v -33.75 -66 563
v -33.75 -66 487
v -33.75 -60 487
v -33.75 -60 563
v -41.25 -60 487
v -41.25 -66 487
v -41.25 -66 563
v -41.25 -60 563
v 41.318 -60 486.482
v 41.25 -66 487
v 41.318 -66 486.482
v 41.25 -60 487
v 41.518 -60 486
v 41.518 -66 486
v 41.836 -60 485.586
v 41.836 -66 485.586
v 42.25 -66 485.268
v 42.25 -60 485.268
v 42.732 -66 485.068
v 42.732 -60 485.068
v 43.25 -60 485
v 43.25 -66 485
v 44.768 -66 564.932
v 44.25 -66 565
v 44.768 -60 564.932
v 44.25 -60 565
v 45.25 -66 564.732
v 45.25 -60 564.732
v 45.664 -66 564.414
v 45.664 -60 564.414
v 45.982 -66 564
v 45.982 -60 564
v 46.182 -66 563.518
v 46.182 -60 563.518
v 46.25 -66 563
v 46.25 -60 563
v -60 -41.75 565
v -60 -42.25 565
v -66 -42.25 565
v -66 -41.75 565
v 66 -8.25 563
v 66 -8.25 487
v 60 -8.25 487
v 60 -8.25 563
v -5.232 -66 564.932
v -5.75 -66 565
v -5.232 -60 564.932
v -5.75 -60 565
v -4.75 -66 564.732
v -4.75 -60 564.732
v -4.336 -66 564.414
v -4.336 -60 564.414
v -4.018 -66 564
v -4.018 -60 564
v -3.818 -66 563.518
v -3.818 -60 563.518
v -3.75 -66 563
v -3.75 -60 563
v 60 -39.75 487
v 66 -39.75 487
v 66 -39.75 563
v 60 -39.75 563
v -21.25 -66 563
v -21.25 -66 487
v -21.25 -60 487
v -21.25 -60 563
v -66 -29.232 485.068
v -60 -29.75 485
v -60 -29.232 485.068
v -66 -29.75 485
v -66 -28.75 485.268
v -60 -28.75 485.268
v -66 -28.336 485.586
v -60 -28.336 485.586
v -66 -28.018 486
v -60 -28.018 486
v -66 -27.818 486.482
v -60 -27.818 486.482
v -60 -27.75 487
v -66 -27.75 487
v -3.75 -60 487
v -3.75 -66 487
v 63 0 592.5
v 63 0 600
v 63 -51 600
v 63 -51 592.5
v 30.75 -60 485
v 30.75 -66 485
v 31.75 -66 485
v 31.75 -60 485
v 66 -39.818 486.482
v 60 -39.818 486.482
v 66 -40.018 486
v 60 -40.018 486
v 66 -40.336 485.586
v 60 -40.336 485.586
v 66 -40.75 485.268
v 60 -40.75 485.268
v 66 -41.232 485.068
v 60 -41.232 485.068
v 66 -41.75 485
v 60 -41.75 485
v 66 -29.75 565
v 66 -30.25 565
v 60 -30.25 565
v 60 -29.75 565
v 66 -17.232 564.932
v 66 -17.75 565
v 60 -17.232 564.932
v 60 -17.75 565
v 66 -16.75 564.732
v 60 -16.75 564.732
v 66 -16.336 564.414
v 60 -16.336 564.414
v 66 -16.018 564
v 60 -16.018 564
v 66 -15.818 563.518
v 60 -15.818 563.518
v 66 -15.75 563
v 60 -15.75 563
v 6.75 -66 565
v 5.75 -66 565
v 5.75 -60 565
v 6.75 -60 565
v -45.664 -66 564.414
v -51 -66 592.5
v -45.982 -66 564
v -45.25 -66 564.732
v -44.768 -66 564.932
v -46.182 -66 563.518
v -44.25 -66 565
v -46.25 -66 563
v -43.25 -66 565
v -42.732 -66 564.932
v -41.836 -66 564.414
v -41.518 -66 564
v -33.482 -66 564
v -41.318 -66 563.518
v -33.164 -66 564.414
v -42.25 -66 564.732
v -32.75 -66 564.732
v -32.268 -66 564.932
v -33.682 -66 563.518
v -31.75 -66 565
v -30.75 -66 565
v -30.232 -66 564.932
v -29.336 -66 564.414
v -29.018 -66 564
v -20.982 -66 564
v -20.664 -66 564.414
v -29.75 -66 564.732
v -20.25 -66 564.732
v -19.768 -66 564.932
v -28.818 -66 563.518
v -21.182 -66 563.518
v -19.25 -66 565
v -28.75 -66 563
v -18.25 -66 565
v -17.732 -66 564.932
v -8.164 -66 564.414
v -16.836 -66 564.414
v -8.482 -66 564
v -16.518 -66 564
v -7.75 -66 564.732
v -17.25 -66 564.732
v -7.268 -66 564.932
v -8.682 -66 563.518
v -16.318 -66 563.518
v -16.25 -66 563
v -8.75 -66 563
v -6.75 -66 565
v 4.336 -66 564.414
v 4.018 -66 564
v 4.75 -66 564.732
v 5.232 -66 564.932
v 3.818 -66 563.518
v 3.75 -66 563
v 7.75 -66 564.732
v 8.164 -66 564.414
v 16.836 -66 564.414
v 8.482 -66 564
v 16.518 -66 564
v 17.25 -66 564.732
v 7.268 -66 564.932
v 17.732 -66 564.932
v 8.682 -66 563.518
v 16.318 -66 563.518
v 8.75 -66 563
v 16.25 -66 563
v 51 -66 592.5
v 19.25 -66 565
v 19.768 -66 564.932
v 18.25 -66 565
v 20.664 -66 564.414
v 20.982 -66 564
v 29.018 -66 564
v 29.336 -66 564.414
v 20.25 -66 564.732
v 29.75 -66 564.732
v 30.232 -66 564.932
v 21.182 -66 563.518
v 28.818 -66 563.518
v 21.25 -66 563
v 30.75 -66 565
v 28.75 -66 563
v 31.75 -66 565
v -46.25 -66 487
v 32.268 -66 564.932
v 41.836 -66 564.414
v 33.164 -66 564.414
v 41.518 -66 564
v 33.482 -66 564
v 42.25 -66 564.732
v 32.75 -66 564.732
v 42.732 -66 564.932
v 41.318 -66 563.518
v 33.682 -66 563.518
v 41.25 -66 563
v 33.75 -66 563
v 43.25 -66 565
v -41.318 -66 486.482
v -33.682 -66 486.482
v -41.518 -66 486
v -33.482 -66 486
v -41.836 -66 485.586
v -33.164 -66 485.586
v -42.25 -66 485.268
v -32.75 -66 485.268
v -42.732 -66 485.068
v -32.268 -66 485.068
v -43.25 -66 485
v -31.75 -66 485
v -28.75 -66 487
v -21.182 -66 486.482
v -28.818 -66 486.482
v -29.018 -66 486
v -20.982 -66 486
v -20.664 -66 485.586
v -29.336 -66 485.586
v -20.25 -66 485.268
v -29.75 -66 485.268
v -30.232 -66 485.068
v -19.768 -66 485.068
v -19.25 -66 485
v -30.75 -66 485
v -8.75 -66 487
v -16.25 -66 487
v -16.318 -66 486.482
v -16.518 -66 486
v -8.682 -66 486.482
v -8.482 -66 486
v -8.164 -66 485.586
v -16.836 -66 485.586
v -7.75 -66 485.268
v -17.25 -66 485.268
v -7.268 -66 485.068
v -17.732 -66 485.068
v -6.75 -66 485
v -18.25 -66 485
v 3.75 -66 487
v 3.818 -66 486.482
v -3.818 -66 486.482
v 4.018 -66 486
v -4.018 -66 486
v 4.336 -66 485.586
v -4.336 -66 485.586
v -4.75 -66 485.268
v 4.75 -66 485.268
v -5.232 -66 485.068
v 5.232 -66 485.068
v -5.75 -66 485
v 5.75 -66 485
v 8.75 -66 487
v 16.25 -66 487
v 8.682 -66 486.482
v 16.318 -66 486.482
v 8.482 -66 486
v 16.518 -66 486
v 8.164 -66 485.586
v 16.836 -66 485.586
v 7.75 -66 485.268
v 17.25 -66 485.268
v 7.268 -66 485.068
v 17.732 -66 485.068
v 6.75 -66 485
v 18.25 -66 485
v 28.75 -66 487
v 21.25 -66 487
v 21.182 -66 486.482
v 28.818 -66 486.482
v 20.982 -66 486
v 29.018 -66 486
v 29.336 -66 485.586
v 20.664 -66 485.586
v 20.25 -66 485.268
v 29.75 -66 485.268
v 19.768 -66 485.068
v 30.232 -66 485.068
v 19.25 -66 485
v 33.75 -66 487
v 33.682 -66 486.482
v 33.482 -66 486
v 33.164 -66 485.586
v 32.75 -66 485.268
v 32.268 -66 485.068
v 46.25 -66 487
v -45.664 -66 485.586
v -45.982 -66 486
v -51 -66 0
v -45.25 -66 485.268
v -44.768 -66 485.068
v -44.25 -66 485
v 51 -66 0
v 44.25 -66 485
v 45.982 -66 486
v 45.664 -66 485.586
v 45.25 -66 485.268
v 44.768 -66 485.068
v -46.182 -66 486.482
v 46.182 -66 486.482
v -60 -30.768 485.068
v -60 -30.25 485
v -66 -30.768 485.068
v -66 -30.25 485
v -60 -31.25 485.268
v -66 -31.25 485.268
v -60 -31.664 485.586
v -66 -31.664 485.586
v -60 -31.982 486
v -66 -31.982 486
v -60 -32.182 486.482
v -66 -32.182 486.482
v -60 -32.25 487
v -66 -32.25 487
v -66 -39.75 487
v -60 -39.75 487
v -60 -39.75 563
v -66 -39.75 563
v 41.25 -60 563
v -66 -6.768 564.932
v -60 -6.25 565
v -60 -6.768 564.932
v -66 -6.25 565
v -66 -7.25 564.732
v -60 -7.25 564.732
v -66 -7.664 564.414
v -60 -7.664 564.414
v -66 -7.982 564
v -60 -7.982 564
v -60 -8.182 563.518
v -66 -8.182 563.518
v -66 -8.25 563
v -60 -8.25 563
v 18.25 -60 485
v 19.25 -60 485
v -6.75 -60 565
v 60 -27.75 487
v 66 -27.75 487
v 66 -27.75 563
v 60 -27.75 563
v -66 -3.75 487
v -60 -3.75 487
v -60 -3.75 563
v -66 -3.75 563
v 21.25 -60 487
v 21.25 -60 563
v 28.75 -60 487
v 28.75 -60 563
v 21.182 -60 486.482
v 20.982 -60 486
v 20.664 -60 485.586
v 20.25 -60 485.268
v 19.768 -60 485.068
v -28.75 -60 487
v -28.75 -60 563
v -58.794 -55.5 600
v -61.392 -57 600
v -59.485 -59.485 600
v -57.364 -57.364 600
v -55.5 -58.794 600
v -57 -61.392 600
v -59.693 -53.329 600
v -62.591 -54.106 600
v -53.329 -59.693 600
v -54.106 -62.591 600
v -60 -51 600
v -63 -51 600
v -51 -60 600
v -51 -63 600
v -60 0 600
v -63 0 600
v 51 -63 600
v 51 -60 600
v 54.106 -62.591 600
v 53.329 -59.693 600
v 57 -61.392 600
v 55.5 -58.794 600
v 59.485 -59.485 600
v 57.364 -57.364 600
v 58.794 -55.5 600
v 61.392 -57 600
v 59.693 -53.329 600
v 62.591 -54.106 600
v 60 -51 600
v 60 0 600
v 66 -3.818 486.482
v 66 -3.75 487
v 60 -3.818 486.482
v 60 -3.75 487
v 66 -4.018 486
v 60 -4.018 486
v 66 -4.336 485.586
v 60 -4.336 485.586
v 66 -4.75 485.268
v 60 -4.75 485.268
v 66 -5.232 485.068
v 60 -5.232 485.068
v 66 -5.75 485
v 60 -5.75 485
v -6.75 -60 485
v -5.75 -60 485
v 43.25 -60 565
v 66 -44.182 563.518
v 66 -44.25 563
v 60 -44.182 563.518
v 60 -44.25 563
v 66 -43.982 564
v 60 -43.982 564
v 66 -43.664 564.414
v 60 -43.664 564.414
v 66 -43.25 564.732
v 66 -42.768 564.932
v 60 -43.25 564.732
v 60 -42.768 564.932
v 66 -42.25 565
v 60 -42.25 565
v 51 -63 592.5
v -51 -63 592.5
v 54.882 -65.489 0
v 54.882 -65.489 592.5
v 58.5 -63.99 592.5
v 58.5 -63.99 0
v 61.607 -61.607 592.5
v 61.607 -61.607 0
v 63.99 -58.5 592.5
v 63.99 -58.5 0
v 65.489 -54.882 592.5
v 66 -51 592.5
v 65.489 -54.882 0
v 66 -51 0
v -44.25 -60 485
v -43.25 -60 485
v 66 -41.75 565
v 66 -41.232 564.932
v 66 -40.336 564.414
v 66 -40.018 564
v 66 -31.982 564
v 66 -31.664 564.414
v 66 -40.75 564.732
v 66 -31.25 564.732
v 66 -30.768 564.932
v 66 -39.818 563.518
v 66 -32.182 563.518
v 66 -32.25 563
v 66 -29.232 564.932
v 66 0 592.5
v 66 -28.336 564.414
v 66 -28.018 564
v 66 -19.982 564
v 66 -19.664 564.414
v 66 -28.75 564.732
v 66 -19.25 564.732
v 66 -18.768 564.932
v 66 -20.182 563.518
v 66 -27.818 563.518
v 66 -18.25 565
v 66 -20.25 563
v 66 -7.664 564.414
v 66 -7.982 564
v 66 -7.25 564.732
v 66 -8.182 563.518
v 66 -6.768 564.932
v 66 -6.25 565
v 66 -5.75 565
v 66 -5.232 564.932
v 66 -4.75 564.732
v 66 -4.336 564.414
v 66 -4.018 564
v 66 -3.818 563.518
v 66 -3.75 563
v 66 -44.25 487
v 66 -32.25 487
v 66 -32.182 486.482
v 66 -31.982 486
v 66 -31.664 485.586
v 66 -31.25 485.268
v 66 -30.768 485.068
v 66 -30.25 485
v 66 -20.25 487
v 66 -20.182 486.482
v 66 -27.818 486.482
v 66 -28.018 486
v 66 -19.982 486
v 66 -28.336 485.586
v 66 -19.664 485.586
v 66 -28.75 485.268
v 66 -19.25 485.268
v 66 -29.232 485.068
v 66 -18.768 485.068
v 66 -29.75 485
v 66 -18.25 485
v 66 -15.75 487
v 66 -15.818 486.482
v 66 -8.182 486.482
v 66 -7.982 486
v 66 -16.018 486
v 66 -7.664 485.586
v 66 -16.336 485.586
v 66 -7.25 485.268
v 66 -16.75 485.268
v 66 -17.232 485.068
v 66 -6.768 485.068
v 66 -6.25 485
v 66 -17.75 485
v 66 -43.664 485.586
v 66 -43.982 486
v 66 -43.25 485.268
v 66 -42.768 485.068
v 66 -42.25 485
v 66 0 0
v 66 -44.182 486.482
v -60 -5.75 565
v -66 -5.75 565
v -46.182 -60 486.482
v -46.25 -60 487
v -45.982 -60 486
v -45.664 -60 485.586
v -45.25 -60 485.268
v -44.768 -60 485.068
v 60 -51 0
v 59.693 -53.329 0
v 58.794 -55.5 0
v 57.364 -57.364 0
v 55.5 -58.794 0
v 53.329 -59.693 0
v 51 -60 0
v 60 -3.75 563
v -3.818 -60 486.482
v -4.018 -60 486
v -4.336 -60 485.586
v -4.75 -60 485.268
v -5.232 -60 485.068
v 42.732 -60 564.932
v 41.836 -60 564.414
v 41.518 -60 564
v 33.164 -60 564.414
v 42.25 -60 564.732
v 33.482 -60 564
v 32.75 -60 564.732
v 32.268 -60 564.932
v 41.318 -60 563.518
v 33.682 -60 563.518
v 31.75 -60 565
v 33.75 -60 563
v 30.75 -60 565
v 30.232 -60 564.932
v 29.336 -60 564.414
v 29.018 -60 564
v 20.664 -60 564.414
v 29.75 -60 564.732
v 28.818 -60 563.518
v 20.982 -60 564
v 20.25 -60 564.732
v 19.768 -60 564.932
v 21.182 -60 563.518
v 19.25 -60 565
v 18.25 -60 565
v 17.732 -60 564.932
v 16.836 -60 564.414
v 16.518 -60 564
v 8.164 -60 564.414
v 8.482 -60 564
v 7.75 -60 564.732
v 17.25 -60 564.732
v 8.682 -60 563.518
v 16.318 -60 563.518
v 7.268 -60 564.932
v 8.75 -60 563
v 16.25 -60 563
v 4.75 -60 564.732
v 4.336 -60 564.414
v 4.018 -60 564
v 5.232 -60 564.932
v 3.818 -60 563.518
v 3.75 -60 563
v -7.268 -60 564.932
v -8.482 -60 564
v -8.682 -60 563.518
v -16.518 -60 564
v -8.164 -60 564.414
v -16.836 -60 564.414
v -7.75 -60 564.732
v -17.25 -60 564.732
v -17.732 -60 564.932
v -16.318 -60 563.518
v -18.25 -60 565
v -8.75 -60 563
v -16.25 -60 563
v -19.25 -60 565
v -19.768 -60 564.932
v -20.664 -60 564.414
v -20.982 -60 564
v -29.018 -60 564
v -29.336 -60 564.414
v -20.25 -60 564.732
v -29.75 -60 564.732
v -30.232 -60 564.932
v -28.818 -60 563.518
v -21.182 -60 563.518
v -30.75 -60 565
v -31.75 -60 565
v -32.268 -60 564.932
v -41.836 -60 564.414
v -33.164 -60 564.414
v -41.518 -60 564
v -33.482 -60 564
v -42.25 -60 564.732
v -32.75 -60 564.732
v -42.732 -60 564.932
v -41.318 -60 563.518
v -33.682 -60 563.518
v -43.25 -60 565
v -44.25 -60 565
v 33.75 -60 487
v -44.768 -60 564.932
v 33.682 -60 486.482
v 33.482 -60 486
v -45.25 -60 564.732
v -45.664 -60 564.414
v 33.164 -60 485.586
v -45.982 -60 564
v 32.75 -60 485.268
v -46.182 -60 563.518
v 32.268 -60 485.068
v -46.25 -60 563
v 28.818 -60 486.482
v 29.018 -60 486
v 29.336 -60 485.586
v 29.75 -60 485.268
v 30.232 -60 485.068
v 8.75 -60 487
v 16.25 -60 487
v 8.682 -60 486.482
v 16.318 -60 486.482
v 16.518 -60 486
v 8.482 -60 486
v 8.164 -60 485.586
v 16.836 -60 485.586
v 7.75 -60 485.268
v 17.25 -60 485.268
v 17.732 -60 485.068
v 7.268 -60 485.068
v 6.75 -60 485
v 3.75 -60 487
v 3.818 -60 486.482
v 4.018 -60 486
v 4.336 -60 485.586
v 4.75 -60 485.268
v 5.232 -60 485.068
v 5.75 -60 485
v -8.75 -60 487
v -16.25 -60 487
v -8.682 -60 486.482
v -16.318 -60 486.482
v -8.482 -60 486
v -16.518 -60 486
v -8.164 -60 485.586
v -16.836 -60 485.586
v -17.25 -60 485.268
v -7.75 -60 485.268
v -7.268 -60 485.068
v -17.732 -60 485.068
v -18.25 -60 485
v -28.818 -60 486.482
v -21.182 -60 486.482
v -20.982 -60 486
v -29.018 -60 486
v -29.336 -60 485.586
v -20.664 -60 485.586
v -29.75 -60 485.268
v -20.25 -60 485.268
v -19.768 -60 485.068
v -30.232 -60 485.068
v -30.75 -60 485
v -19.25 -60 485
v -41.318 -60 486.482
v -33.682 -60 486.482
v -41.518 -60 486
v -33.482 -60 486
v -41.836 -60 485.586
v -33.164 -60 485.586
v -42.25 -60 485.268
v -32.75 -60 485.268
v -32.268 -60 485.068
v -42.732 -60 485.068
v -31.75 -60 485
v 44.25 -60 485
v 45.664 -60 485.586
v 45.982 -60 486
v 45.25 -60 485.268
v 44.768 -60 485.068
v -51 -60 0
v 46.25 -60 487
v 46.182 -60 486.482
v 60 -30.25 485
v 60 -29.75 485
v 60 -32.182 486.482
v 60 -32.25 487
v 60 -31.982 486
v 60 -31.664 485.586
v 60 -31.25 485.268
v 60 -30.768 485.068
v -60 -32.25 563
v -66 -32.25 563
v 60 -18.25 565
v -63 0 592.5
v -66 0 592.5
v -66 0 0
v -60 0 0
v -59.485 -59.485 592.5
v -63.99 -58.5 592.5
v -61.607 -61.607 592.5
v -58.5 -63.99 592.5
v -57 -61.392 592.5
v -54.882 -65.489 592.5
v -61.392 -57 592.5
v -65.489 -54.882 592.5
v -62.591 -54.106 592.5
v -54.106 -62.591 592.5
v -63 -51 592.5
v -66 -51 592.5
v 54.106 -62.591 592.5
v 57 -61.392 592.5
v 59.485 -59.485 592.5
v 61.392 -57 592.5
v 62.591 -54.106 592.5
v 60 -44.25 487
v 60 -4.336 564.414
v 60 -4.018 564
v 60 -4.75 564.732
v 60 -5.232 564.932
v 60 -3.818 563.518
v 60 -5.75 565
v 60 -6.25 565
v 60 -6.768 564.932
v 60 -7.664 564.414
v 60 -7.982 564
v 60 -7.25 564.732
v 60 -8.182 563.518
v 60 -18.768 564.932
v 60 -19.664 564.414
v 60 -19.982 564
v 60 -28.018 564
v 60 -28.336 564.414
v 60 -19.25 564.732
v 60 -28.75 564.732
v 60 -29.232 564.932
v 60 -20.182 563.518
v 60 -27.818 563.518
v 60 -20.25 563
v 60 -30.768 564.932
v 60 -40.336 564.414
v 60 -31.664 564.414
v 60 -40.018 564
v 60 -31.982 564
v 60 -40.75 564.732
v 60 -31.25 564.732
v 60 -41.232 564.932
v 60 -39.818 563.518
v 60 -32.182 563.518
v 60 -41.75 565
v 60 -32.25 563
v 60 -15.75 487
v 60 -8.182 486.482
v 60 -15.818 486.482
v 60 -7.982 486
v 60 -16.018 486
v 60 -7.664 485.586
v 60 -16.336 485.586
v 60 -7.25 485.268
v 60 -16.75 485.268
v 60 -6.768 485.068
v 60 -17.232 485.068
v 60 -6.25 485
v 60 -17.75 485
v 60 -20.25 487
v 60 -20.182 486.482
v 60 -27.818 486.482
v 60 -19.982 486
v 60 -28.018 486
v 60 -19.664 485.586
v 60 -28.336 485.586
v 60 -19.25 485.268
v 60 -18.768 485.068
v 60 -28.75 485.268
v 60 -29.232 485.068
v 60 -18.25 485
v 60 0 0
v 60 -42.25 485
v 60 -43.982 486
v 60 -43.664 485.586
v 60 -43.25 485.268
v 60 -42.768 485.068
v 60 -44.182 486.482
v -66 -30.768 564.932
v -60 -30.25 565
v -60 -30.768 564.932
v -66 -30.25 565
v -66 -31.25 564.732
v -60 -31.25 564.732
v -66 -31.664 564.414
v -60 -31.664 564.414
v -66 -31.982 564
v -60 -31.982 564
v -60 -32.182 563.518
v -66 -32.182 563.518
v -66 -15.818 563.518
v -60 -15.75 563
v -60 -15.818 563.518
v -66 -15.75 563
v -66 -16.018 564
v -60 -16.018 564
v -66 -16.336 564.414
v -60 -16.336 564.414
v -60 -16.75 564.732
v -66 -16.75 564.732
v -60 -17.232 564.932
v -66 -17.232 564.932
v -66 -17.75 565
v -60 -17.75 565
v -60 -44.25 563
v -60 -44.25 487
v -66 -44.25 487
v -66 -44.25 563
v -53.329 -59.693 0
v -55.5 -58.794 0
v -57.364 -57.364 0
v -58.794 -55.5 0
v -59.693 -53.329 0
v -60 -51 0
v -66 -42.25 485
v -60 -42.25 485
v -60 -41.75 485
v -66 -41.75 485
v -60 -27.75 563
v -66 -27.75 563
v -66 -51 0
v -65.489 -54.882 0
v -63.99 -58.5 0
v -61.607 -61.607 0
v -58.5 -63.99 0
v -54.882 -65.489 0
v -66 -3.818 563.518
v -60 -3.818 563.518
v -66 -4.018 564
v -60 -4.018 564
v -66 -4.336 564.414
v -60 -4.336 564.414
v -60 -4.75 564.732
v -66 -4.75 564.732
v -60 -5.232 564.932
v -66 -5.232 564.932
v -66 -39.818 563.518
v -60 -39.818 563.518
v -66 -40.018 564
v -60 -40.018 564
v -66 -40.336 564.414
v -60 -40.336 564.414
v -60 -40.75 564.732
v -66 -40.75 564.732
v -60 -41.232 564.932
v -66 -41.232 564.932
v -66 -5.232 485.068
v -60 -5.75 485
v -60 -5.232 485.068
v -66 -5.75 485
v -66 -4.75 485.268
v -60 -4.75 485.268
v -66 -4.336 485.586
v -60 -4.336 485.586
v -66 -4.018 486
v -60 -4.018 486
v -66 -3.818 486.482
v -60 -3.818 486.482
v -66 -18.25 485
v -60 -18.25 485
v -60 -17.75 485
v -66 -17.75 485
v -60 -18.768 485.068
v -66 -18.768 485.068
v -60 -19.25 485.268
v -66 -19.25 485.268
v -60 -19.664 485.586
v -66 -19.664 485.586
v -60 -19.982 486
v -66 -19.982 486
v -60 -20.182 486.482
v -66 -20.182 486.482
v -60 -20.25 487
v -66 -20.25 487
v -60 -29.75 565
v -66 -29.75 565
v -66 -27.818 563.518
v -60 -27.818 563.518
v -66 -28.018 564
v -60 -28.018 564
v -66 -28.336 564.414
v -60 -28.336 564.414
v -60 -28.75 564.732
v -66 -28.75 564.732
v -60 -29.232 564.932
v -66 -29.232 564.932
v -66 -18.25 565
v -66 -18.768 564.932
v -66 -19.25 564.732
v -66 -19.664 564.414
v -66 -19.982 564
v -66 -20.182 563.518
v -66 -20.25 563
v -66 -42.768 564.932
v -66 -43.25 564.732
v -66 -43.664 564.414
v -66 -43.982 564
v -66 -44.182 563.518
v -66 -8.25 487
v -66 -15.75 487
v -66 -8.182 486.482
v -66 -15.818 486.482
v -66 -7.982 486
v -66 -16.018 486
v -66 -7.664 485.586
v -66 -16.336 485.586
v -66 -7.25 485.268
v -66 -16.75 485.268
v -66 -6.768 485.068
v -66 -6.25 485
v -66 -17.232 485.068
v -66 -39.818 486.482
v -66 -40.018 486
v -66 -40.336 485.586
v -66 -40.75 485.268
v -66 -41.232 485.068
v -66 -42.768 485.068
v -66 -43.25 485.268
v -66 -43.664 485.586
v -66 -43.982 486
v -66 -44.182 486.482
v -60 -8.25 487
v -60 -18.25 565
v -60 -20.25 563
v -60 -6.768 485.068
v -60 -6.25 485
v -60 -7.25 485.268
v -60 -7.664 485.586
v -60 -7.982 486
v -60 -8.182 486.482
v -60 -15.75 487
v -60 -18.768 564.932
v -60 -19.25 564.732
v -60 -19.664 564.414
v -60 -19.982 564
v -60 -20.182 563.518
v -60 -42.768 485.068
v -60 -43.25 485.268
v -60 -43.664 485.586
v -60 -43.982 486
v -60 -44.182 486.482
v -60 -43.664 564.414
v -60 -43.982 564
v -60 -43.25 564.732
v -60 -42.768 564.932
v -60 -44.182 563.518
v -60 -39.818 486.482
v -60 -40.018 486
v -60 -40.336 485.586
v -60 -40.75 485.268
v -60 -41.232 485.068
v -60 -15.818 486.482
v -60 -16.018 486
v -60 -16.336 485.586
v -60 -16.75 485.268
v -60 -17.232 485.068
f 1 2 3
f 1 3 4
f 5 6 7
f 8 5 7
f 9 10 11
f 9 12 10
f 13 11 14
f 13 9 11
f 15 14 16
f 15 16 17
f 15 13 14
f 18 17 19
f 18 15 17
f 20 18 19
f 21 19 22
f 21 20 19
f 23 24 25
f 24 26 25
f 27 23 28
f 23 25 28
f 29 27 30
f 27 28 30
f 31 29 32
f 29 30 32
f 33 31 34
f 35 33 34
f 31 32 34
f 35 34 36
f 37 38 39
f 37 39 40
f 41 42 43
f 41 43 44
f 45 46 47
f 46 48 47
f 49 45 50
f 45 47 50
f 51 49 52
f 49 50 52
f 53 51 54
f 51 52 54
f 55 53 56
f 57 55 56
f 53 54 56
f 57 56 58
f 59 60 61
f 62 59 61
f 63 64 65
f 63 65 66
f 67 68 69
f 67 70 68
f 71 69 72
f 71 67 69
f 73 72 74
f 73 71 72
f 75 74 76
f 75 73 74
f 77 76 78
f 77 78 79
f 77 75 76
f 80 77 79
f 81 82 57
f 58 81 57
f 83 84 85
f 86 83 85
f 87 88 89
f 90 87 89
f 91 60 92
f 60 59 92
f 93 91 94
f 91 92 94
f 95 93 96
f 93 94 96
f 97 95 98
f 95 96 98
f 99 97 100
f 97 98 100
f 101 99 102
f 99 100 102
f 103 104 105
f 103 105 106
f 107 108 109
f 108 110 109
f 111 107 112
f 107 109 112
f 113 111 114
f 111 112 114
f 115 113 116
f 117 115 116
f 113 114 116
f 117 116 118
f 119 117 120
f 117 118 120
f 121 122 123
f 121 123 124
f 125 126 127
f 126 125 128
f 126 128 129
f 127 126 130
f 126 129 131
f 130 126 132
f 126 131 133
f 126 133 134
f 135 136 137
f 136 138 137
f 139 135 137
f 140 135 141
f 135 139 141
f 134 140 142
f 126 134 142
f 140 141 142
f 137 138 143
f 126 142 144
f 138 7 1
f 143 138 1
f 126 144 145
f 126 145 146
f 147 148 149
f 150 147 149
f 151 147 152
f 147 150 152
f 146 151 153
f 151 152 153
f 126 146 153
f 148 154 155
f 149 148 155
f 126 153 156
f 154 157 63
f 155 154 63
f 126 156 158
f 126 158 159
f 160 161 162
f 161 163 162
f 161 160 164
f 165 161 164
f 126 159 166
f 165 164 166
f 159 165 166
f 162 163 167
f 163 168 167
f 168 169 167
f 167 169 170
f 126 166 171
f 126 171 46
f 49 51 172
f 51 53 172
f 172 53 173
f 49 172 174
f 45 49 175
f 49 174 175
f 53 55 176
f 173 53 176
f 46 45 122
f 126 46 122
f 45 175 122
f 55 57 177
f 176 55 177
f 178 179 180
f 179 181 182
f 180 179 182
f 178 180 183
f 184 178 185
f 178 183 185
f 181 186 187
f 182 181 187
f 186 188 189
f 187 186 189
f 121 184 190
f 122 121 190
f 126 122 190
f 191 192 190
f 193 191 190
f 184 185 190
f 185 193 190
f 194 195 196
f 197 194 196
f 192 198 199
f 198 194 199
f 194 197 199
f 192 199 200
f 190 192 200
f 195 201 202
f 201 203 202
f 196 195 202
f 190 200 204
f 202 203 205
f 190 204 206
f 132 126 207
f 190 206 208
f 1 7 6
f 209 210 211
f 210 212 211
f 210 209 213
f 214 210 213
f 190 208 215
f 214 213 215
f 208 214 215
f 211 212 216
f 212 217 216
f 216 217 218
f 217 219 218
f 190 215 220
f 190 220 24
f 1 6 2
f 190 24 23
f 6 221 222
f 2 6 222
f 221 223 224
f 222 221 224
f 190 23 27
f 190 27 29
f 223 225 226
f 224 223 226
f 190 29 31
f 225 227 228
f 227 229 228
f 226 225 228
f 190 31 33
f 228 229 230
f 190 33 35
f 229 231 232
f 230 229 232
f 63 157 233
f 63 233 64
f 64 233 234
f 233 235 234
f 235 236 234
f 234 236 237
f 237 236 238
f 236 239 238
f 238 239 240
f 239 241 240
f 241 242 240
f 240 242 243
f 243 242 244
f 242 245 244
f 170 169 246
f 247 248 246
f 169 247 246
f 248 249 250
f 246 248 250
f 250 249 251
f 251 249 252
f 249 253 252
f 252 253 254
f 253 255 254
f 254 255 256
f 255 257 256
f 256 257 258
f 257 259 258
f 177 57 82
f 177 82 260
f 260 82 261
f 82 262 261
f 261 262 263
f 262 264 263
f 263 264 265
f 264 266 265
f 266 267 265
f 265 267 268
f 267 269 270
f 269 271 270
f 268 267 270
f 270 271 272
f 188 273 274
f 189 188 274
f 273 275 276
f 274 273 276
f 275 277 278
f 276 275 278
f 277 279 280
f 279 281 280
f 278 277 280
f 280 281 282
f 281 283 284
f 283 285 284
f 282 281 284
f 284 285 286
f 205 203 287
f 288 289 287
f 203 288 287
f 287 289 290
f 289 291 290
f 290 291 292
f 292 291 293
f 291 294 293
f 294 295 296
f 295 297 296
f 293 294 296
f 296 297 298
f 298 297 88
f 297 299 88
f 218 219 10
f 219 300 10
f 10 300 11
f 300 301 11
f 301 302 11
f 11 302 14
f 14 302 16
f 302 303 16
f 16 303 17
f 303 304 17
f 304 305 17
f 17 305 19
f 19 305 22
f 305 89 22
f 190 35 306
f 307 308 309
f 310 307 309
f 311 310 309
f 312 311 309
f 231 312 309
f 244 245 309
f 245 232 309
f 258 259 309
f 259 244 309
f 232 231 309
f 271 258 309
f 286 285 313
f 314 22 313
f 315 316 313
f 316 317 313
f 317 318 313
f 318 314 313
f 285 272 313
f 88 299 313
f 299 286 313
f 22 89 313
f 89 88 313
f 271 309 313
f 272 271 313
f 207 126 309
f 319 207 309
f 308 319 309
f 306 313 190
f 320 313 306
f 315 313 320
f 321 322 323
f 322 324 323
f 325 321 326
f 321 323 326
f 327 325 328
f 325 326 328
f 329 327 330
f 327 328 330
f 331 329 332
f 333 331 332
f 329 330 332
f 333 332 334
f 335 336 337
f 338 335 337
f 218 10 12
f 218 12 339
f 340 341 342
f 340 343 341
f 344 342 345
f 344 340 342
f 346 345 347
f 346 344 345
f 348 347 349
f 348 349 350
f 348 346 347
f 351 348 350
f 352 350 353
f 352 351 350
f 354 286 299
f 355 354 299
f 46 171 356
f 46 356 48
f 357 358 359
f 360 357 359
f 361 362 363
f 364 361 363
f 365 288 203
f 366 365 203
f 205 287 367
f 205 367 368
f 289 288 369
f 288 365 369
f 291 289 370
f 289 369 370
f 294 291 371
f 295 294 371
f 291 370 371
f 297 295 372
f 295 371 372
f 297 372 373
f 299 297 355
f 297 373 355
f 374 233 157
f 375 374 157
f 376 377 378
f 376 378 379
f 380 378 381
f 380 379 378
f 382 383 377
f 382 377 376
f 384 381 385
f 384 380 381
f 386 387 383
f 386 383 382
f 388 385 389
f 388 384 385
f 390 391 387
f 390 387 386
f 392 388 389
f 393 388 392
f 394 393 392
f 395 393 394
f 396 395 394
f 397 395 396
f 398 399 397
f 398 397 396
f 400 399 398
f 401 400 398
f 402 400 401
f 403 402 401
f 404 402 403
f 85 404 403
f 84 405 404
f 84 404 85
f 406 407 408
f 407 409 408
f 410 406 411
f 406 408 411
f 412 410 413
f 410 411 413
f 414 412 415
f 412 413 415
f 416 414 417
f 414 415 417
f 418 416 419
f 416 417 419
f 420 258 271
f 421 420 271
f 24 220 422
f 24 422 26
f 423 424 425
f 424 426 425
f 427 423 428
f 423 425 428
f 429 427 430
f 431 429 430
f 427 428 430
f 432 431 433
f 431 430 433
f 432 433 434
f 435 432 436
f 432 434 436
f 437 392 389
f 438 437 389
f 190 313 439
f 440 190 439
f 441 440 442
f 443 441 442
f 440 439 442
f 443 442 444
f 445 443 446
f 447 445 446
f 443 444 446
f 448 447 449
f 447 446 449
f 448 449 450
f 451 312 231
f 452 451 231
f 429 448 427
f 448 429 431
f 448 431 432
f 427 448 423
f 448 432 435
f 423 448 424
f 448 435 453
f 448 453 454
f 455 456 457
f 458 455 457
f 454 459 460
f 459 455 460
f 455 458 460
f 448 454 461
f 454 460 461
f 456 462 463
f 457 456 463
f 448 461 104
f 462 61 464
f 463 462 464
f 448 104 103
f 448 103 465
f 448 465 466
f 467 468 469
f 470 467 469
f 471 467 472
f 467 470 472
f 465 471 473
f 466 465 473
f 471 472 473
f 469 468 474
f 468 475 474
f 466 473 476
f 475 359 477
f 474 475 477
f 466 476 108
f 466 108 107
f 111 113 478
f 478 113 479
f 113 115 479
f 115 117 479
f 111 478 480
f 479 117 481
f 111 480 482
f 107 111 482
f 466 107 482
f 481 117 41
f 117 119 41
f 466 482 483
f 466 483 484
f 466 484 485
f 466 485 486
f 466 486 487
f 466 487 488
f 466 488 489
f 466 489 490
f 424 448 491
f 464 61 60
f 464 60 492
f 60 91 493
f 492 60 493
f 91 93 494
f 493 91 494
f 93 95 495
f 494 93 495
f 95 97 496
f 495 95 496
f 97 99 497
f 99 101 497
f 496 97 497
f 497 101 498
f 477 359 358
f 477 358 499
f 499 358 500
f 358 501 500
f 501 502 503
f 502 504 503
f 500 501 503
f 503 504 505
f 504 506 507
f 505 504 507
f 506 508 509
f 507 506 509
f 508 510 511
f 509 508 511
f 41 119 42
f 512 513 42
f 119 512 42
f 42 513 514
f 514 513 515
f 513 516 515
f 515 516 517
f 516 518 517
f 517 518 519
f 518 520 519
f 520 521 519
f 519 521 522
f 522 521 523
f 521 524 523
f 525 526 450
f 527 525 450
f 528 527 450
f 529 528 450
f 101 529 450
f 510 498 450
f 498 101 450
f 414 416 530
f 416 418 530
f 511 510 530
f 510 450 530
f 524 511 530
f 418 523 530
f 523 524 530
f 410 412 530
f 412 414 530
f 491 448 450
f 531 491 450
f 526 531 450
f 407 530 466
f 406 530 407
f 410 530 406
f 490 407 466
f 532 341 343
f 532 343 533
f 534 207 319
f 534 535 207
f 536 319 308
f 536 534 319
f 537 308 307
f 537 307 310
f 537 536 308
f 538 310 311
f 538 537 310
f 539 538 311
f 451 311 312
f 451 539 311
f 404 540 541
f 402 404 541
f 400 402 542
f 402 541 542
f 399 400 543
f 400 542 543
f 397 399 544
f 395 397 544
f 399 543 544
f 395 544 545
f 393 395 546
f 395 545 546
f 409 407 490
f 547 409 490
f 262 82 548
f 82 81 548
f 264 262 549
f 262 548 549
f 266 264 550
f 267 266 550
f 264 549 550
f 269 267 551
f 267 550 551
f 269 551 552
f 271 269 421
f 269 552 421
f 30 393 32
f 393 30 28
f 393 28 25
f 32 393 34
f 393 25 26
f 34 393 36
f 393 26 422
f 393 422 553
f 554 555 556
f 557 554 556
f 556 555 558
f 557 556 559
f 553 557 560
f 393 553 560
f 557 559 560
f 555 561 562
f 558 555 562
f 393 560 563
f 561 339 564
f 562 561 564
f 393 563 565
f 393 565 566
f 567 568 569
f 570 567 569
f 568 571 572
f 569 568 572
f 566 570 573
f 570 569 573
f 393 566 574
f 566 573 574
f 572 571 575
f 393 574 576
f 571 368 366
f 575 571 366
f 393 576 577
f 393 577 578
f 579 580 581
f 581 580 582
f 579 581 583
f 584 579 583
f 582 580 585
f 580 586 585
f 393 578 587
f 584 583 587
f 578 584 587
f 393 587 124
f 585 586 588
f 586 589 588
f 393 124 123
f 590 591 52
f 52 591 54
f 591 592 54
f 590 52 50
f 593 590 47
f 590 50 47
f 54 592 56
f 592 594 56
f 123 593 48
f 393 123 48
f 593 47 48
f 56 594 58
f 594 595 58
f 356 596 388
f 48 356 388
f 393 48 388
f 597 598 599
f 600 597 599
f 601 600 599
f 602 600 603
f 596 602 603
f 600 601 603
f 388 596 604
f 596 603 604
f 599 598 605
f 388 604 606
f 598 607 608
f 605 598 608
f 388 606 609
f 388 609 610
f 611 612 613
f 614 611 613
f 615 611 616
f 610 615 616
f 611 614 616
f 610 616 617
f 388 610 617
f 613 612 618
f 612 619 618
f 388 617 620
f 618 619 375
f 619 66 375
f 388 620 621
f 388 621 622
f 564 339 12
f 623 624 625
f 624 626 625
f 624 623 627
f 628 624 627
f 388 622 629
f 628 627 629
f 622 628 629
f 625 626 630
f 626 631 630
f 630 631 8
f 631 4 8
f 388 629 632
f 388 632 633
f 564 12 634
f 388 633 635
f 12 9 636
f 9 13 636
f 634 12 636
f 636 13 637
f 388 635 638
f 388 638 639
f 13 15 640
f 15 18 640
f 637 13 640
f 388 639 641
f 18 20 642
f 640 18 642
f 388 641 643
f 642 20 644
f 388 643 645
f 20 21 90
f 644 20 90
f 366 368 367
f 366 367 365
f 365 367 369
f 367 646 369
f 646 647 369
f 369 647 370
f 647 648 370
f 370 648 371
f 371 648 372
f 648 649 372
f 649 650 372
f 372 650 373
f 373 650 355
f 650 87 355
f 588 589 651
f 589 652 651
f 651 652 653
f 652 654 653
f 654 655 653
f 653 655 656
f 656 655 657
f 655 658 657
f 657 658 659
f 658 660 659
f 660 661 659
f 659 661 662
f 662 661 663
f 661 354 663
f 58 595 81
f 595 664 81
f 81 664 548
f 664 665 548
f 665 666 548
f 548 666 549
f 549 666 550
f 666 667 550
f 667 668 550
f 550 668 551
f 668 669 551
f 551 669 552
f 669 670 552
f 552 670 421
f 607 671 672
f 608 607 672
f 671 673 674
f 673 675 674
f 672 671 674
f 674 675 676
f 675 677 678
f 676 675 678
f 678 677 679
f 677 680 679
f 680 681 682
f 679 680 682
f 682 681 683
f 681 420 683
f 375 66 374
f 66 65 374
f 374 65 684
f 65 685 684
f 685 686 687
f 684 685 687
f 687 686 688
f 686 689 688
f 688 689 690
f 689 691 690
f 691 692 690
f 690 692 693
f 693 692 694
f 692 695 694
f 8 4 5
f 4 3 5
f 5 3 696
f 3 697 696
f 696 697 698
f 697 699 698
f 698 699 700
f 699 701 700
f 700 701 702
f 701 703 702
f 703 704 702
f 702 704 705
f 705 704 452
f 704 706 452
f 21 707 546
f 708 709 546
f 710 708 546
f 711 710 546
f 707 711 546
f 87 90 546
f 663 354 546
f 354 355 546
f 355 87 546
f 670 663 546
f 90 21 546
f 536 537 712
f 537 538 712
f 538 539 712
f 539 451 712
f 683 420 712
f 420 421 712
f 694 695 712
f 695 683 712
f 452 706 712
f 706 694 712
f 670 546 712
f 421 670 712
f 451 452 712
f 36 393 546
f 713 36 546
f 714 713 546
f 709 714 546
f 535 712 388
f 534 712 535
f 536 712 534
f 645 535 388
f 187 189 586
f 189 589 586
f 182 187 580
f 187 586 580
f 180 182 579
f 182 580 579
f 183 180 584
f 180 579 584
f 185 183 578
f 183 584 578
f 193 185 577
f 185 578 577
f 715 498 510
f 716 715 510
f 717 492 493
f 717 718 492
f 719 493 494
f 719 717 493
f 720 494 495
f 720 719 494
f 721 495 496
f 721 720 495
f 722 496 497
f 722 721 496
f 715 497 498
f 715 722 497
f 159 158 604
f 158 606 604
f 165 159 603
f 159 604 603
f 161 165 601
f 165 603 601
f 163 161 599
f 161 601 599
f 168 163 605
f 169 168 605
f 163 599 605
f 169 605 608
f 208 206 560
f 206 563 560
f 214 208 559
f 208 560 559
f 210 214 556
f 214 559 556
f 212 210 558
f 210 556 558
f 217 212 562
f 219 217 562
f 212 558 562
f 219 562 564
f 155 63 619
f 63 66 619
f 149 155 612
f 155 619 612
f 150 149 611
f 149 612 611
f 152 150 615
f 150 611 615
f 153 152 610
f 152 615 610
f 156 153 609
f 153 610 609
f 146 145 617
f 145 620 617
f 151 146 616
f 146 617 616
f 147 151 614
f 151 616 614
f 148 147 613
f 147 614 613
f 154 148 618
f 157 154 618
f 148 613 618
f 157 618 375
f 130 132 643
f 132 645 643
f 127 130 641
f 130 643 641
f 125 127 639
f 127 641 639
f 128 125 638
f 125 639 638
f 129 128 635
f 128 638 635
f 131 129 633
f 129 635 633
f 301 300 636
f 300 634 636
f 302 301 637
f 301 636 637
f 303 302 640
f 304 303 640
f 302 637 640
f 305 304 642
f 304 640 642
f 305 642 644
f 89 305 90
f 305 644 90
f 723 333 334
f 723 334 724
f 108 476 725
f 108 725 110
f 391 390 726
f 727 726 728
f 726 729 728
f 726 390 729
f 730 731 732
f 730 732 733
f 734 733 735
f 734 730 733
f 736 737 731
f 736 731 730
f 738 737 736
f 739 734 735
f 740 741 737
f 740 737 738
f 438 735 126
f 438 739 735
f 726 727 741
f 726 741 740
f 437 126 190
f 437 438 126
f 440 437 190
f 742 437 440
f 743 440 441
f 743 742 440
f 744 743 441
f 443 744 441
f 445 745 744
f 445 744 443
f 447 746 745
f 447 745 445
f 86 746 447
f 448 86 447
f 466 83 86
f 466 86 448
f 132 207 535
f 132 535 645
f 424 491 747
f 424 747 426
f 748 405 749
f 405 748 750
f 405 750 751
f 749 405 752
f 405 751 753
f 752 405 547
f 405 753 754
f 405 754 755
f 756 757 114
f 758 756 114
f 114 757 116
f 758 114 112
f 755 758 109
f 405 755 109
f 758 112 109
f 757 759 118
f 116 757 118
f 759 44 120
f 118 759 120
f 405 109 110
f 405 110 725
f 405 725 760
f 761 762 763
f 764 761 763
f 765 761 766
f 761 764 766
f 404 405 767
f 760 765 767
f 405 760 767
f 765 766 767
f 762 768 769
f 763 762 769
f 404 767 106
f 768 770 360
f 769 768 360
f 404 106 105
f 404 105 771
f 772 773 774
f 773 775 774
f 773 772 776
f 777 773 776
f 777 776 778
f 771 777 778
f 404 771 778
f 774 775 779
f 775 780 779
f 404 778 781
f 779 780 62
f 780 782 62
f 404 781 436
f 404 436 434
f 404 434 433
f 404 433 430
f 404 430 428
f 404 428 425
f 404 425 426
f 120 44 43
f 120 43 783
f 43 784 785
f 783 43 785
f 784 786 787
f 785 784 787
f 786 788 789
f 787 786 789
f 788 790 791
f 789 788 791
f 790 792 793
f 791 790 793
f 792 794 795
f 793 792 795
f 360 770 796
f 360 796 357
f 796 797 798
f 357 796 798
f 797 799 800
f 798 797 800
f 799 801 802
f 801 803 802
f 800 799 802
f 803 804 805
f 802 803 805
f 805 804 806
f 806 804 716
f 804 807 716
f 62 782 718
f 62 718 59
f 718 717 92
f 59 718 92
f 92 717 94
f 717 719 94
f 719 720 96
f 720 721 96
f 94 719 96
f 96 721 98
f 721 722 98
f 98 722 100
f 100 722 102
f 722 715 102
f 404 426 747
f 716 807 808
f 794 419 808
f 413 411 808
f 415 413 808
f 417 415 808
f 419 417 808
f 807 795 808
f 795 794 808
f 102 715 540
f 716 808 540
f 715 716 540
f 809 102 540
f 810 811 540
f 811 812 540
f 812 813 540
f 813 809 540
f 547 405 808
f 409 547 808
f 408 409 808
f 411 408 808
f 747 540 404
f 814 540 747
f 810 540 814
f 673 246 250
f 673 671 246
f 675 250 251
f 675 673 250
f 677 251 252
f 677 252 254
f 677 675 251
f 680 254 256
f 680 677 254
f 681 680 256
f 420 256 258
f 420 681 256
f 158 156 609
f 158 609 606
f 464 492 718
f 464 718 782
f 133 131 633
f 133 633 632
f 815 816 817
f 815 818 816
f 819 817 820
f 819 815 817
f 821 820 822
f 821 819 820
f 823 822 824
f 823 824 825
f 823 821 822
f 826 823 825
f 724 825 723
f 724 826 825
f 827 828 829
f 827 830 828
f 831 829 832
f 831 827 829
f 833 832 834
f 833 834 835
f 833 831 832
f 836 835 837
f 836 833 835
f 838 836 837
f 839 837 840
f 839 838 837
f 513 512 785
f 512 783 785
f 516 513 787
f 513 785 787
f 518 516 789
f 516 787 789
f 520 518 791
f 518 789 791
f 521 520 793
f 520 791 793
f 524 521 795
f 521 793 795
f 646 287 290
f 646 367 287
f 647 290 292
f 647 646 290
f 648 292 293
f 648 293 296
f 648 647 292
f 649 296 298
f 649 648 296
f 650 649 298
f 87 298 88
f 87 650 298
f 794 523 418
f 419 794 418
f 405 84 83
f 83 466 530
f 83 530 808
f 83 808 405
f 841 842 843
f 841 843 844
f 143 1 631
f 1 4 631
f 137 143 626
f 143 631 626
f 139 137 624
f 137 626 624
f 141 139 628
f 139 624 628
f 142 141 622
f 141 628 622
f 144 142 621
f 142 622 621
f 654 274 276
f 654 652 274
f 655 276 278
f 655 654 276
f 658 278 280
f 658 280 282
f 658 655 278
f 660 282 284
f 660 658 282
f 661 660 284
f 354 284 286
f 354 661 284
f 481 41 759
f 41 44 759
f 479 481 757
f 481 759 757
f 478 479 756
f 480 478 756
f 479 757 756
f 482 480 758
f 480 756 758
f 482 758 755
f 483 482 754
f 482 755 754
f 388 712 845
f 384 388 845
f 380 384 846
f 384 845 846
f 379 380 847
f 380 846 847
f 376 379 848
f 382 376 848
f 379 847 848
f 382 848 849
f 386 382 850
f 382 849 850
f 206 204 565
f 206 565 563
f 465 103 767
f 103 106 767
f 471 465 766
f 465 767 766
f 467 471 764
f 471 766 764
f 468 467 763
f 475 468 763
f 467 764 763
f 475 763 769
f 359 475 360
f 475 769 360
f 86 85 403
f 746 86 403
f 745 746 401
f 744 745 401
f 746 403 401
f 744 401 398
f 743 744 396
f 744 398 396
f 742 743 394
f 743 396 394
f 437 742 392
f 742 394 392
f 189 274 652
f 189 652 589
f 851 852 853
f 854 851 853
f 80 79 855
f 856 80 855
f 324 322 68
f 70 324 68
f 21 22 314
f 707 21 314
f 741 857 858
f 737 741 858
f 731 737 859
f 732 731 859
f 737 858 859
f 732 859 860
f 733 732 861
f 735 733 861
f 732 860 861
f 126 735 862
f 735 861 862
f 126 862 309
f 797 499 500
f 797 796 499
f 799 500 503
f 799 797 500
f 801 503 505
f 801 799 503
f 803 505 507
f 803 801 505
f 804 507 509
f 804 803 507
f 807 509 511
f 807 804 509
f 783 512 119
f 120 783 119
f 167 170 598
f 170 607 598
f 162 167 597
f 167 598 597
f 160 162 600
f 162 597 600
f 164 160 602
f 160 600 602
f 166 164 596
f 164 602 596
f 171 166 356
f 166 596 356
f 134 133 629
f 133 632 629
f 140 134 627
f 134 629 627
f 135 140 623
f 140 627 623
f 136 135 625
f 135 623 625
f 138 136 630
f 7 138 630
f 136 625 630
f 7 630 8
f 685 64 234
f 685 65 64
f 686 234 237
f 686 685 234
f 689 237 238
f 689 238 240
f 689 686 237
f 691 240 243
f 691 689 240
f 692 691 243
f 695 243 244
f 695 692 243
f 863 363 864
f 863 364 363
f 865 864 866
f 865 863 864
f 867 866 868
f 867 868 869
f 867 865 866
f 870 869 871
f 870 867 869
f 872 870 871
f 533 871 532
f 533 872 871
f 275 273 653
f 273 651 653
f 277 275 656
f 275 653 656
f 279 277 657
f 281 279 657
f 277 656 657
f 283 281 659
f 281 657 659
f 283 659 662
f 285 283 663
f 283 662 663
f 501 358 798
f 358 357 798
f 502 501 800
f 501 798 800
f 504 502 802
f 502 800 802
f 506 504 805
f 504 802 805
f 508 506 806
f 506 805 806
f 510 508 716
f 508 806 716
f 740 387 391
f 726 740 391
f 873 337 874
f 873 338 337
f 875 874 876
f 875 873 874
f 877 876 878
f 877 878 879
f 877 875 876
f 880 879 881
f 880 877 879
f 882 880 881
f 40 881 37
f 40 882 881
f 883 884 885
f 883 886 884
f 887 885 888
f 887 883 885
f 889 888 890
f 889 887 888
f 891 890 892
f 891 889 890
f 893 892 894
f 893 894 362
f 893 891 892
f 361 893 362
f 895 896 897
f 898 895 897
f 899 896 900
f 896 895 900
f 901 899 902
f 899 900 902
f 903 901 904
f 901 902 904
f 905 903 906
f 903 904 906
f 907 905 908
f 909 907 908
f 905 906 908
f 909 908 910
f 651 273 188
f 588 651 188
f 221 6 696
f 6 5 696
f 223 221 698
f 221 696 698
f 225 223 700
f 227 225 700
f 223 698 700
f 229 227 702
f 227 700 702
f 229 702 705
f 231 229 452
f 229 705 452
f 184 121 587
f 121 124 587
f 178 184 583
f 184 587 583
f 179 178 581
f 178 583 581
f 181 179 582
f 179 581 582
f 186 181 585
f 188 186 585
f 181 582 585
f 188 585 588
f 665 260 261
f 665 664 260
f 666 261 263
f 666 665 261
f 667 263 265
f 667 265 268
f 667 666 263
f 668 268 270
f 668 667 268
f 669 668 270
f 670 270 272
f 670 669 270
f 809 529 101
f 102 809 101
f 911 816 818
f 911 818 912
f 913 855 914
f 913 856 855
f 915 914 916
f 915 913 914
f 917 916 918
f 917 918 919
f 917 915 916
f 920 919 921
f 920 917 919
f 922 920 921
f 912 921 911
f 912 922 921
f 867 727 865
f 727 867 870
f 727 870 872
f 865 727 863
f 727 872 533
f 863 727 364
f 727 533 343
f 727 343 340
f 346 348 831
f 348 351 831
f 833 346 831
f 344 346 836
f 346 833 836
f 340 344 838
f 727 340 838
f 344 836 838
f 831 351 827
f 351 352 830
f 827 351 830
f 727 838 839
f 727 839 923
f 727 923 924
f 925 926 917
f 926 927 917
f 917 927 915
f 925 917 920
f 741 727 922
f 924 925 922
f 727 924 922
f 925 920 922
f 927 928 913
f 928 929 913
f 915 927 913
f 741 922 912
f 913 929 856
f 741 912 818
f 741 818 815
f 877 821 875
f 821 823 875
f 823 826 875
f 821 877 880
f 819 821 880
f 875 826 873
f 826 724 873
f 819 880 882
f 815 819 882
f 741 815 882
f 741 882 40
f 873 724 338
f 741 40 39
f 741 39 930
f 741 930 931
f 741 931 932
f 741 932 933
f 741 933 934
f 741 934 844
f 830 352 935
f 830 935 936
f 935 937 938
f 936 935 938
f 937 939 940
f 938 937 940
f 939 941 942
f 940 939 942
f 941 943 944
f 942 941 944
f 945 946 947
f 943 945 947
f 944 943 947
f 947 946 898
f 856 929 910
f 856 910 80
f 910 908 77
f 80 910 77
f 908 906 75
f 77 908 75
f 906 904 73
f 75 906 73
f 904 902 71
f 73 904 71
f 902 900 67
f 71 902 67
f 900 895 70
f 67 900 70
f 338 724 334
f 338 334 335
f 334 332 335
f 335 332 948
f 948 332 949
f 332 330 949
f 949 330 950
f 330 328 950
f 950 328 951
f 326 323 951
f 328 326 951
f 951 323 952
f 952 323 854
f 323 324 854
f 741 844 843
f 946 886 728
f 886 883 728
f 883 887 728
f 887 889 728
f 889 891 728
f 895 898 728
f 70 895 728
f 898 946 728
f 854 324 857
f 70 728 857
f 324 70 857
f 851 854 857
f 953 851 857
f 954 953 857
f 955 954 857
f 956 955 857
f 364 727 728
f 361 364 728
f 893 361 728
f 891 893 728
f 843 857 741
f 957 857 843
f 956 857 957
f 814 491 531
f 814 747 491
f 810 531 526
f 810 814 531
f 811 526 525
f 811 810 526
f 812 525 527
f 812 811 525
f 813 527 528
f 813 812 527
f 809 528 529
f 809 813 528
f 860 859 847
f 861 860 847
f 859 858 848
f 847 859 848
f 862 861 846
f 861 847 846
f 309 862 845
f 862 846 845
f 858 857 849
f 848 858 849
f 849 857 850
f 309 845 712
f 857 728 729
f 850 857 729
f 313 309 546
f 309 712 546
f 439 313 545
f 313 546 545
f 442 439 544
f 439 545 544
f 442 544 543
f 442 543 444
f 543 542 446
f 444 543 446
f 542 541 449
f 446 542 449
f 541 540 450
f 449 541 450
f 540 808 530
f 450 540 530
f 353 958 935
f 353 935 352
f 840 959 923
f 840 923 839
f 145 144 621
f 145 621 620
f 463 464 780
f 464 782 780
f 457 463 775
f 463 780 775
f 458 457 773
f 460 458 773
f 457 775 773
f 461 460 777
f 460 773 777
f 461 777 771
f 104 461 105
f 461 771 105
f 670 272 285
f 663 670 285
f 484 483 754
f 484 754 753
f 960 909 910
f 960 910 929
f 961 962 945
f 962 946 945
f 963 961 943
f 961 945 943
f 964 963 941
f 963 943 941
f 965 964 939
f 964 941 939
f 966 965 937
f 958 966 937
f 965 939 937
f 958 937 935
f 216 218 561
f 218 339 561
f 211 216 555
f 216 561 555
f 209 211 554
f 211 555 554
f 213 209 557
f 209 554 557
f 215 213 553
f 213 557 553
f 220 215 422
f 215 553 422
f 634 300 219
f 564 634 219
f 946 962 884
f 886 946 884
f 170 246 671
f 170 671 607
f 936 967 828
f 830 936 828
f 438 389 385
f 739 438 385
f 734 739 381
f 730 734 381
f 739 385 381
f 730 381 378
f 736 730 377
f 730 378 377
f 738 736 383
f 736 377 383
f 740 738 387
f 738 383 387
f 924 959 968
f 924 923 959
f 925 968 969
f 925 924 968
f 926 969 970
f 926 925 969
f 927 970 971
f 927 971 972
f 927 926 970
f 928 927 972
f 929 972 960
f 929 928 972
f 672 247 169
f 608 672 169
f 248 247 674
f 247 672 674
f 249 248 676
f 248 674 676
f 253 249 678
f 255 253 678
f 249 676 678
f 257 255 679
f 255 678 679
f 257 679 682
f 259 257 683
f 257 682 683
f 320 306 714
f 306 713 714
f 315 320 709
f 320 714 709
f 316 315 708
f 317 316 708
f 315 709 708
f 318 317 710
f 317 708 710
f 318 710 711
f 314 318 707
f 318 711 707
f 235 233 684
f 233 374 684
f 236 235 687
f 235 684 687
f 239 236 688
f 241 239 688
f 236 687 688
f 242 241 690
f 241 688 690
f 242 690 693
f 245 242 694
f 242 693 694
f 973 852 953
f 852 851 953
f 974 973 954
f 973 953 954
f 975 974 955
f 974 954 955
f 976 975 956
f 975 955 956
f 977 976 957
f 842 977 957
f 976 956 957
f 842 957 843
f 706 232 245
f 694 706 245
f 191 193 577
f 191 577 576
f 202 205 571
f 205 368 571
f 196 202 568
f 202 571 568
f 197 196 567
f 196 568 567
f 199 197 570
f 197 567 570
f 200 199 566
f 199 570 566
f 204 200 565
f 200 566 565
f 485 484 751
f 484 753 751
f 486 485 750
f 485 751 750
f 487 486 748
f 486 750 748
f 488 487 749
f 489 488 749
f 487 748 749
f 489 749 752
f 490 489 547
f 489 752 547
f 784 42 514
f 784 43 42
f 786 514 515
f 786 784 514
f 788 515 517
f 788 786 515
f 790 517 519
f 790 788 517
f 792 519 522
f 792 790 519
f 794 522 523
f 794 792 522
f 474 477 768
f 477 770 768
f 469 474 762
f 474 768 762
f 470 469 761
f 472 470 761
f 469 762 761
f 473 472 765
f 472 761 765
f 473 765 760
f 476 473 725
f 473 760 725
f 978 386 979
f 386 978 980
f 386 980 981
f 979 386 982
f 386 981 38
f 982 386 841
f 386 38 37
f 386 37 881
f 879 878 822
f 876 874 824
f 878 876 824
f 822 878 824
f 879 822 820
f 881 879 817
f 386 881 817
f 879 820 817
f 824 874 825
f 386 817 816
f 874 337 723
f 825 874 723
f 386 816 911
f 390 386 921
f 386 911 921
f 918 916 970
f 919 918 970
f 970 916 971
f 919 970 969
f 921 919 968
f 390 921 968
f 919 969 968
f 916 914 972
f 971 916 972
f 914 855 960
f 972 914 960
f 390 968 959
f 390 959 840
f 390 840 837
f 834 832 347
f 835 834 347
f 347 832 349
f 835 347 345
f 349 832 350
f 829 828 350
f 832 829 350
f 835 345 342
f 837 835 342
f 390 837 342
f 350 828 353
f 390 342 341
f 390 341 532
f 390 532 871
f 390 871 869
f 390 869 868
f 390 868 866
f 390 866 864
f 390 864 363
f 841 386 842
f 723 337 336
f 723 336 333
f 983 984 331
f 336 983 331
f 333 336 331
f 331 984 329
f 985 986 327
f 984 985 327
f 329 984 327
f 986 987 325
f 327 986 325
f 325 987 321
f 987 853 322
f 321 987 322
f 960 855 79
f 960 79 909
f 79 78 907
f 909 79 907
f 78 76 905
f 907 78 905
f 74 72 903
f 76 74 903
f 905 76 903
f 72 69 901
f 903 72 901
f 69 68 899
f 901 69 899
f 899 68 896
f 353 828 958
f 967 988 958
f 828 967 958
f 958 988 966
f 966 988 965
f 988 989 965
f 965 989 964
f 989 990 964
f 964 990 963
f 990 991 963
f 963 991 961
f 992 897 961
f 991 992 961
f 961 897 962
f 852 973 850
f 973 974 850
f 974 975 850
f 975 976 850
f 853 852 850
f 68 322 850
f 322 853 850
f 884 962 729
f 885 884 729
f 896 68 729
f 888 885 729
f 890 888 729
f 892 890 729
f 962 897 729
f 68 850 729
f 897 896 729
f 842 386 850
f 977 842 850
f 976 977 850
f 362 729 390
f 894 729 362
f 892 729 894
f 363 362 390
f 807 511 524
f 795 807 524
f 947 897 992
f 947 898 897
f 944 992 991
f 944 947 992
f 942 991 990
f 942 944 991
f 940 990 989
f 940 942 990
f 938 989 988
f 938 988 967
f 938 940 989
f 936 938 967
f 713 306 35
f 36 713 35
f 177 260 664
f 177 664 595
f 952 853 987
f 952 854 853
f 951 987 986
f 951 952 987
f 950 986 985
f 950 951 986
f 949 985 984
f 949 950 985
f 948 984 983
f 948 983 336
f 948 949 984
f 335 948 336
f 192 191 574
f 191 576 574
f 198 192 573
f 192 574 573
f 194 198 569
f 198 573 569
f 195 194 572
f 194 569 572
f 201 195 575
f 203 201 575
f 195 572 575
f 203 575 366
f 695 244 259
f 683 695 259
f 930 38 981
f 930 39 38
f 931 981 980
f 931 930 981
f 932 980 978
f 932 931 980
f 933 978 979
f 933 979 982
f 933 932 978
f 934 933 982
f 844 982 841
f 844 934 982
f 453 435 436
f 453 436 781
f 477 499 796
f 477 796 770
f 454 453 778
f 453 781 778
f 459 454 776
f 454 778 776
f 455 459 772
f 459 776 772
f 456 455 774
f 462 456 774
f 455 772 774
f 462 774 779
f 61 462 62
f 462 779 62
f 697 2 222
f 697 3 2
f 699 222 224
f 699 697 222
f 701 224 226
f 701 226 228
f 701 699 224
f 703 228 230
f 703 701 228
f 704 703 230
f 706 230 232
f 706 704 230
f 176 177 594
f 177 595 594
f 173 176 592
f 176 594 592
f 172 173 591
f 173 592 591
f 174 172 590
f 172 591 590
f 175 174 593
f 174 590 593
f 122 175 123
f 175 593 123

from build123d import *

# Parameters (mm, degrees)
F1_DEPTH = 600
F2_W     = 5
F2_H     = 80
F3_DEPTH = 25
F4_R     = 2
F5_W     = 4.5
F5_H     = 80
F6_DEPTH = 132.001
F7_R     = 2
F9_DEPTH = 7.5


with BuildPart() as f1:
    # F0 (on Top) → F1 (new body)
    with BuildSketch(Plane.XY):
        with BuildLine():
            Line((-60, 0), (-66, 0))
            Line((-66, 0), (-66, -51))
            ThreePointArc((-66, -51), (-61.606602, -61.606602), (-51, -66))
            Line((-51, -66), (51, -66))
            ThreePointArc((51, -66), (61.606602, -61.606602), (66, -51))
            Line((66, -51), (66, 0))
            Line((66, 0), (60, 0))
            Line((60, 0), (60, -51))
            ThreePointArc((60, -51), (57.363961, -57.363961), (51, -60))
            Line((51, -60), (-51, -60))
            ThreePointArc((-51, -60), (-57.363961, -57.363961), (-60, -51))
            Line((-60, -51), (-60, 0))
        make_face()
    extrude(amount=F1_DEPTH)

    # F2 (on face) → F3 (cut)
    with BuildSketch(Plane.XZ.offset(66)):
        with Locations((-43.75, 525)):
            Rectangle(F2_W, F2_H)
        with Locations((-31.25, 525)):
            Rectangle(F2_W, F2_H)
        with Locations((-18.75, 525)):
            Rectangle(F2_W, F2_H)
        with Locations((-6.25, 525)):
            Rectangle(F2_W, F2_H)
        with Locations((6.25, 525)):
            Rectangle(F2_W, F2_H)
        with Locations((18.75, 525)):
            Rectangle(F2_W, F2_H)
        with Locations((31.25, 525)):
            Rectangle(F2_W, F2_H)
        with Locations((43.75, 525)):
            Rectangle(F2_W, F2_H)
    extrude(amount=-F3_DEPTH, mode=Mode.SUBTRACT)

    # F4
    f4_edges = [f1.edges().sort_by_distance(p)[0] for p in [
        (-46.25, -63, 485),
        (-33.75, -63, 485),
        (-21.25, -63, 485),
        (-8.75, -63, 485),
        (3.75, -63, 485),
        (16.25, -63, 485),
        (28.75, -63, 485),
        (41.25, -63, 485),
        (-46.25, -63, 565),
        (-33.75, -63, 565),
        (-21.25, -63, 565),
        (-8.75, -63, 565),
        (3.75, -63, 565),
        (16.25, -63, 565),
        (28.75, -63, 565),
        (41.25, -63, 565),
        (-41.25, -63, 565),
        (-28.75, -63, 565),
        (-16.25, -63, 565),
        (-3.75, -63, 565),
        (8.75, -63, 565),
        (21.25, -63, 565),
        (33.75, -63, 565),
        (46.25, -63, 565),
        (46.25, -63, 485),
        (33.75, -63, 485),
        (21.25, -63, 485),
        (8.75, -63, 485),
        (-3.75, -63, 485),
        (-16.25, -63, 485),
        (-28.75, -63, 485),
        (-41.25, -63, 485),
    ]]
    fillet(f4_edges, radius=F4_R)

    # F5 (on face) → F6 (cut, through all)
    with BuildSketch(Plane.YZ.offset(66)):
        with Locations((-42, 525)):
            Rectangle(F5_W, F5_H)
        with Locations((-30, 525)):
            Rectangle(F5_W, F5_H)
        with Locations((-18, 525)):
            Rectangle(F5_W, F5_H)
        with Locations((-6, 525)):
            Rectangle(F5_W, F5_H)
    extrude(amount=-F6_DEPTH, mode=Mode.SUBTRACT)

    # F7
    f7_edges = [f1.edges().sort_by_distance(p)[0] for p in [
        (-63, -3.75, 485),
        (63, -3.75, 485),
        (-63, -15.75, 485),
        (63, -15.75, 485),
        (-63, -27.75, 485),
        (63, -27.75, 485),
        (-63, -39.75, 485),
        (63, -39.75, 485),
        (-63, -44.25, 485),
        (63, -44.25, 485),
        (-63, -32.25, 485),
        (63, -32.25, 485),
        (-63, -20.25, 485),
        (63, -20.25, 485),
        (-63, -8.25, 485),
        (63, -8.25, 485),
        (-63, -39.75, 565),
        (63, -39.75, 565),
        (-63, -27.75, 565),
        (63, -27.75, 565),
        (-63, -15.75, 565),
        (63, -15.75, 565),
        (-63, -3.75, 565),
        (63, -3.75, 565),
        (-63, -8.25, 565),
        (63, -8.25, 565),
        (-63, -20.25, 565),
        (63, -20.25, 565),
        (-63, -32.25, 565),
        (63, -32.25, 565),
        (-63, -44.25, 565),
        (63, -44.25, 565),
    ]]
    fillet(f7_edges, radius=F7_R)

    # F8 (on face) → F9 (cut)
    with BuildSketch(Plane.XY.offset(600)):
        with BuildLine():
            Line((-63, -51), (-63, 0))
            Line((-63, 0), (-66, 0))
            Line((-66, 0), (-66, -51))
            ThreePointArc((-66, -51), (-61.606602, -61.606602), (-51, -66))
            Line((-51, -66), (51, -66))
            ThreePointArc((51, -66), (61.606602, -61.606602), (66, -51))
            Line((66, -51), (66, 0))
            Line((66, 0), (63, 0))
            Line((63, 0), (63, -51))
            ThreePointArc((63, -51), (59.485281, -59.485281), (51, -63))
            Line((51, -63), (-51, -63))
            ThreePointArc((-51, -63), (-59.485281, -59.485281), (-63, -51))
        make_face()
    extrude(amount=-F9_DEPTH, mode=Mode.SUBTRACT)


solid = f1.part
